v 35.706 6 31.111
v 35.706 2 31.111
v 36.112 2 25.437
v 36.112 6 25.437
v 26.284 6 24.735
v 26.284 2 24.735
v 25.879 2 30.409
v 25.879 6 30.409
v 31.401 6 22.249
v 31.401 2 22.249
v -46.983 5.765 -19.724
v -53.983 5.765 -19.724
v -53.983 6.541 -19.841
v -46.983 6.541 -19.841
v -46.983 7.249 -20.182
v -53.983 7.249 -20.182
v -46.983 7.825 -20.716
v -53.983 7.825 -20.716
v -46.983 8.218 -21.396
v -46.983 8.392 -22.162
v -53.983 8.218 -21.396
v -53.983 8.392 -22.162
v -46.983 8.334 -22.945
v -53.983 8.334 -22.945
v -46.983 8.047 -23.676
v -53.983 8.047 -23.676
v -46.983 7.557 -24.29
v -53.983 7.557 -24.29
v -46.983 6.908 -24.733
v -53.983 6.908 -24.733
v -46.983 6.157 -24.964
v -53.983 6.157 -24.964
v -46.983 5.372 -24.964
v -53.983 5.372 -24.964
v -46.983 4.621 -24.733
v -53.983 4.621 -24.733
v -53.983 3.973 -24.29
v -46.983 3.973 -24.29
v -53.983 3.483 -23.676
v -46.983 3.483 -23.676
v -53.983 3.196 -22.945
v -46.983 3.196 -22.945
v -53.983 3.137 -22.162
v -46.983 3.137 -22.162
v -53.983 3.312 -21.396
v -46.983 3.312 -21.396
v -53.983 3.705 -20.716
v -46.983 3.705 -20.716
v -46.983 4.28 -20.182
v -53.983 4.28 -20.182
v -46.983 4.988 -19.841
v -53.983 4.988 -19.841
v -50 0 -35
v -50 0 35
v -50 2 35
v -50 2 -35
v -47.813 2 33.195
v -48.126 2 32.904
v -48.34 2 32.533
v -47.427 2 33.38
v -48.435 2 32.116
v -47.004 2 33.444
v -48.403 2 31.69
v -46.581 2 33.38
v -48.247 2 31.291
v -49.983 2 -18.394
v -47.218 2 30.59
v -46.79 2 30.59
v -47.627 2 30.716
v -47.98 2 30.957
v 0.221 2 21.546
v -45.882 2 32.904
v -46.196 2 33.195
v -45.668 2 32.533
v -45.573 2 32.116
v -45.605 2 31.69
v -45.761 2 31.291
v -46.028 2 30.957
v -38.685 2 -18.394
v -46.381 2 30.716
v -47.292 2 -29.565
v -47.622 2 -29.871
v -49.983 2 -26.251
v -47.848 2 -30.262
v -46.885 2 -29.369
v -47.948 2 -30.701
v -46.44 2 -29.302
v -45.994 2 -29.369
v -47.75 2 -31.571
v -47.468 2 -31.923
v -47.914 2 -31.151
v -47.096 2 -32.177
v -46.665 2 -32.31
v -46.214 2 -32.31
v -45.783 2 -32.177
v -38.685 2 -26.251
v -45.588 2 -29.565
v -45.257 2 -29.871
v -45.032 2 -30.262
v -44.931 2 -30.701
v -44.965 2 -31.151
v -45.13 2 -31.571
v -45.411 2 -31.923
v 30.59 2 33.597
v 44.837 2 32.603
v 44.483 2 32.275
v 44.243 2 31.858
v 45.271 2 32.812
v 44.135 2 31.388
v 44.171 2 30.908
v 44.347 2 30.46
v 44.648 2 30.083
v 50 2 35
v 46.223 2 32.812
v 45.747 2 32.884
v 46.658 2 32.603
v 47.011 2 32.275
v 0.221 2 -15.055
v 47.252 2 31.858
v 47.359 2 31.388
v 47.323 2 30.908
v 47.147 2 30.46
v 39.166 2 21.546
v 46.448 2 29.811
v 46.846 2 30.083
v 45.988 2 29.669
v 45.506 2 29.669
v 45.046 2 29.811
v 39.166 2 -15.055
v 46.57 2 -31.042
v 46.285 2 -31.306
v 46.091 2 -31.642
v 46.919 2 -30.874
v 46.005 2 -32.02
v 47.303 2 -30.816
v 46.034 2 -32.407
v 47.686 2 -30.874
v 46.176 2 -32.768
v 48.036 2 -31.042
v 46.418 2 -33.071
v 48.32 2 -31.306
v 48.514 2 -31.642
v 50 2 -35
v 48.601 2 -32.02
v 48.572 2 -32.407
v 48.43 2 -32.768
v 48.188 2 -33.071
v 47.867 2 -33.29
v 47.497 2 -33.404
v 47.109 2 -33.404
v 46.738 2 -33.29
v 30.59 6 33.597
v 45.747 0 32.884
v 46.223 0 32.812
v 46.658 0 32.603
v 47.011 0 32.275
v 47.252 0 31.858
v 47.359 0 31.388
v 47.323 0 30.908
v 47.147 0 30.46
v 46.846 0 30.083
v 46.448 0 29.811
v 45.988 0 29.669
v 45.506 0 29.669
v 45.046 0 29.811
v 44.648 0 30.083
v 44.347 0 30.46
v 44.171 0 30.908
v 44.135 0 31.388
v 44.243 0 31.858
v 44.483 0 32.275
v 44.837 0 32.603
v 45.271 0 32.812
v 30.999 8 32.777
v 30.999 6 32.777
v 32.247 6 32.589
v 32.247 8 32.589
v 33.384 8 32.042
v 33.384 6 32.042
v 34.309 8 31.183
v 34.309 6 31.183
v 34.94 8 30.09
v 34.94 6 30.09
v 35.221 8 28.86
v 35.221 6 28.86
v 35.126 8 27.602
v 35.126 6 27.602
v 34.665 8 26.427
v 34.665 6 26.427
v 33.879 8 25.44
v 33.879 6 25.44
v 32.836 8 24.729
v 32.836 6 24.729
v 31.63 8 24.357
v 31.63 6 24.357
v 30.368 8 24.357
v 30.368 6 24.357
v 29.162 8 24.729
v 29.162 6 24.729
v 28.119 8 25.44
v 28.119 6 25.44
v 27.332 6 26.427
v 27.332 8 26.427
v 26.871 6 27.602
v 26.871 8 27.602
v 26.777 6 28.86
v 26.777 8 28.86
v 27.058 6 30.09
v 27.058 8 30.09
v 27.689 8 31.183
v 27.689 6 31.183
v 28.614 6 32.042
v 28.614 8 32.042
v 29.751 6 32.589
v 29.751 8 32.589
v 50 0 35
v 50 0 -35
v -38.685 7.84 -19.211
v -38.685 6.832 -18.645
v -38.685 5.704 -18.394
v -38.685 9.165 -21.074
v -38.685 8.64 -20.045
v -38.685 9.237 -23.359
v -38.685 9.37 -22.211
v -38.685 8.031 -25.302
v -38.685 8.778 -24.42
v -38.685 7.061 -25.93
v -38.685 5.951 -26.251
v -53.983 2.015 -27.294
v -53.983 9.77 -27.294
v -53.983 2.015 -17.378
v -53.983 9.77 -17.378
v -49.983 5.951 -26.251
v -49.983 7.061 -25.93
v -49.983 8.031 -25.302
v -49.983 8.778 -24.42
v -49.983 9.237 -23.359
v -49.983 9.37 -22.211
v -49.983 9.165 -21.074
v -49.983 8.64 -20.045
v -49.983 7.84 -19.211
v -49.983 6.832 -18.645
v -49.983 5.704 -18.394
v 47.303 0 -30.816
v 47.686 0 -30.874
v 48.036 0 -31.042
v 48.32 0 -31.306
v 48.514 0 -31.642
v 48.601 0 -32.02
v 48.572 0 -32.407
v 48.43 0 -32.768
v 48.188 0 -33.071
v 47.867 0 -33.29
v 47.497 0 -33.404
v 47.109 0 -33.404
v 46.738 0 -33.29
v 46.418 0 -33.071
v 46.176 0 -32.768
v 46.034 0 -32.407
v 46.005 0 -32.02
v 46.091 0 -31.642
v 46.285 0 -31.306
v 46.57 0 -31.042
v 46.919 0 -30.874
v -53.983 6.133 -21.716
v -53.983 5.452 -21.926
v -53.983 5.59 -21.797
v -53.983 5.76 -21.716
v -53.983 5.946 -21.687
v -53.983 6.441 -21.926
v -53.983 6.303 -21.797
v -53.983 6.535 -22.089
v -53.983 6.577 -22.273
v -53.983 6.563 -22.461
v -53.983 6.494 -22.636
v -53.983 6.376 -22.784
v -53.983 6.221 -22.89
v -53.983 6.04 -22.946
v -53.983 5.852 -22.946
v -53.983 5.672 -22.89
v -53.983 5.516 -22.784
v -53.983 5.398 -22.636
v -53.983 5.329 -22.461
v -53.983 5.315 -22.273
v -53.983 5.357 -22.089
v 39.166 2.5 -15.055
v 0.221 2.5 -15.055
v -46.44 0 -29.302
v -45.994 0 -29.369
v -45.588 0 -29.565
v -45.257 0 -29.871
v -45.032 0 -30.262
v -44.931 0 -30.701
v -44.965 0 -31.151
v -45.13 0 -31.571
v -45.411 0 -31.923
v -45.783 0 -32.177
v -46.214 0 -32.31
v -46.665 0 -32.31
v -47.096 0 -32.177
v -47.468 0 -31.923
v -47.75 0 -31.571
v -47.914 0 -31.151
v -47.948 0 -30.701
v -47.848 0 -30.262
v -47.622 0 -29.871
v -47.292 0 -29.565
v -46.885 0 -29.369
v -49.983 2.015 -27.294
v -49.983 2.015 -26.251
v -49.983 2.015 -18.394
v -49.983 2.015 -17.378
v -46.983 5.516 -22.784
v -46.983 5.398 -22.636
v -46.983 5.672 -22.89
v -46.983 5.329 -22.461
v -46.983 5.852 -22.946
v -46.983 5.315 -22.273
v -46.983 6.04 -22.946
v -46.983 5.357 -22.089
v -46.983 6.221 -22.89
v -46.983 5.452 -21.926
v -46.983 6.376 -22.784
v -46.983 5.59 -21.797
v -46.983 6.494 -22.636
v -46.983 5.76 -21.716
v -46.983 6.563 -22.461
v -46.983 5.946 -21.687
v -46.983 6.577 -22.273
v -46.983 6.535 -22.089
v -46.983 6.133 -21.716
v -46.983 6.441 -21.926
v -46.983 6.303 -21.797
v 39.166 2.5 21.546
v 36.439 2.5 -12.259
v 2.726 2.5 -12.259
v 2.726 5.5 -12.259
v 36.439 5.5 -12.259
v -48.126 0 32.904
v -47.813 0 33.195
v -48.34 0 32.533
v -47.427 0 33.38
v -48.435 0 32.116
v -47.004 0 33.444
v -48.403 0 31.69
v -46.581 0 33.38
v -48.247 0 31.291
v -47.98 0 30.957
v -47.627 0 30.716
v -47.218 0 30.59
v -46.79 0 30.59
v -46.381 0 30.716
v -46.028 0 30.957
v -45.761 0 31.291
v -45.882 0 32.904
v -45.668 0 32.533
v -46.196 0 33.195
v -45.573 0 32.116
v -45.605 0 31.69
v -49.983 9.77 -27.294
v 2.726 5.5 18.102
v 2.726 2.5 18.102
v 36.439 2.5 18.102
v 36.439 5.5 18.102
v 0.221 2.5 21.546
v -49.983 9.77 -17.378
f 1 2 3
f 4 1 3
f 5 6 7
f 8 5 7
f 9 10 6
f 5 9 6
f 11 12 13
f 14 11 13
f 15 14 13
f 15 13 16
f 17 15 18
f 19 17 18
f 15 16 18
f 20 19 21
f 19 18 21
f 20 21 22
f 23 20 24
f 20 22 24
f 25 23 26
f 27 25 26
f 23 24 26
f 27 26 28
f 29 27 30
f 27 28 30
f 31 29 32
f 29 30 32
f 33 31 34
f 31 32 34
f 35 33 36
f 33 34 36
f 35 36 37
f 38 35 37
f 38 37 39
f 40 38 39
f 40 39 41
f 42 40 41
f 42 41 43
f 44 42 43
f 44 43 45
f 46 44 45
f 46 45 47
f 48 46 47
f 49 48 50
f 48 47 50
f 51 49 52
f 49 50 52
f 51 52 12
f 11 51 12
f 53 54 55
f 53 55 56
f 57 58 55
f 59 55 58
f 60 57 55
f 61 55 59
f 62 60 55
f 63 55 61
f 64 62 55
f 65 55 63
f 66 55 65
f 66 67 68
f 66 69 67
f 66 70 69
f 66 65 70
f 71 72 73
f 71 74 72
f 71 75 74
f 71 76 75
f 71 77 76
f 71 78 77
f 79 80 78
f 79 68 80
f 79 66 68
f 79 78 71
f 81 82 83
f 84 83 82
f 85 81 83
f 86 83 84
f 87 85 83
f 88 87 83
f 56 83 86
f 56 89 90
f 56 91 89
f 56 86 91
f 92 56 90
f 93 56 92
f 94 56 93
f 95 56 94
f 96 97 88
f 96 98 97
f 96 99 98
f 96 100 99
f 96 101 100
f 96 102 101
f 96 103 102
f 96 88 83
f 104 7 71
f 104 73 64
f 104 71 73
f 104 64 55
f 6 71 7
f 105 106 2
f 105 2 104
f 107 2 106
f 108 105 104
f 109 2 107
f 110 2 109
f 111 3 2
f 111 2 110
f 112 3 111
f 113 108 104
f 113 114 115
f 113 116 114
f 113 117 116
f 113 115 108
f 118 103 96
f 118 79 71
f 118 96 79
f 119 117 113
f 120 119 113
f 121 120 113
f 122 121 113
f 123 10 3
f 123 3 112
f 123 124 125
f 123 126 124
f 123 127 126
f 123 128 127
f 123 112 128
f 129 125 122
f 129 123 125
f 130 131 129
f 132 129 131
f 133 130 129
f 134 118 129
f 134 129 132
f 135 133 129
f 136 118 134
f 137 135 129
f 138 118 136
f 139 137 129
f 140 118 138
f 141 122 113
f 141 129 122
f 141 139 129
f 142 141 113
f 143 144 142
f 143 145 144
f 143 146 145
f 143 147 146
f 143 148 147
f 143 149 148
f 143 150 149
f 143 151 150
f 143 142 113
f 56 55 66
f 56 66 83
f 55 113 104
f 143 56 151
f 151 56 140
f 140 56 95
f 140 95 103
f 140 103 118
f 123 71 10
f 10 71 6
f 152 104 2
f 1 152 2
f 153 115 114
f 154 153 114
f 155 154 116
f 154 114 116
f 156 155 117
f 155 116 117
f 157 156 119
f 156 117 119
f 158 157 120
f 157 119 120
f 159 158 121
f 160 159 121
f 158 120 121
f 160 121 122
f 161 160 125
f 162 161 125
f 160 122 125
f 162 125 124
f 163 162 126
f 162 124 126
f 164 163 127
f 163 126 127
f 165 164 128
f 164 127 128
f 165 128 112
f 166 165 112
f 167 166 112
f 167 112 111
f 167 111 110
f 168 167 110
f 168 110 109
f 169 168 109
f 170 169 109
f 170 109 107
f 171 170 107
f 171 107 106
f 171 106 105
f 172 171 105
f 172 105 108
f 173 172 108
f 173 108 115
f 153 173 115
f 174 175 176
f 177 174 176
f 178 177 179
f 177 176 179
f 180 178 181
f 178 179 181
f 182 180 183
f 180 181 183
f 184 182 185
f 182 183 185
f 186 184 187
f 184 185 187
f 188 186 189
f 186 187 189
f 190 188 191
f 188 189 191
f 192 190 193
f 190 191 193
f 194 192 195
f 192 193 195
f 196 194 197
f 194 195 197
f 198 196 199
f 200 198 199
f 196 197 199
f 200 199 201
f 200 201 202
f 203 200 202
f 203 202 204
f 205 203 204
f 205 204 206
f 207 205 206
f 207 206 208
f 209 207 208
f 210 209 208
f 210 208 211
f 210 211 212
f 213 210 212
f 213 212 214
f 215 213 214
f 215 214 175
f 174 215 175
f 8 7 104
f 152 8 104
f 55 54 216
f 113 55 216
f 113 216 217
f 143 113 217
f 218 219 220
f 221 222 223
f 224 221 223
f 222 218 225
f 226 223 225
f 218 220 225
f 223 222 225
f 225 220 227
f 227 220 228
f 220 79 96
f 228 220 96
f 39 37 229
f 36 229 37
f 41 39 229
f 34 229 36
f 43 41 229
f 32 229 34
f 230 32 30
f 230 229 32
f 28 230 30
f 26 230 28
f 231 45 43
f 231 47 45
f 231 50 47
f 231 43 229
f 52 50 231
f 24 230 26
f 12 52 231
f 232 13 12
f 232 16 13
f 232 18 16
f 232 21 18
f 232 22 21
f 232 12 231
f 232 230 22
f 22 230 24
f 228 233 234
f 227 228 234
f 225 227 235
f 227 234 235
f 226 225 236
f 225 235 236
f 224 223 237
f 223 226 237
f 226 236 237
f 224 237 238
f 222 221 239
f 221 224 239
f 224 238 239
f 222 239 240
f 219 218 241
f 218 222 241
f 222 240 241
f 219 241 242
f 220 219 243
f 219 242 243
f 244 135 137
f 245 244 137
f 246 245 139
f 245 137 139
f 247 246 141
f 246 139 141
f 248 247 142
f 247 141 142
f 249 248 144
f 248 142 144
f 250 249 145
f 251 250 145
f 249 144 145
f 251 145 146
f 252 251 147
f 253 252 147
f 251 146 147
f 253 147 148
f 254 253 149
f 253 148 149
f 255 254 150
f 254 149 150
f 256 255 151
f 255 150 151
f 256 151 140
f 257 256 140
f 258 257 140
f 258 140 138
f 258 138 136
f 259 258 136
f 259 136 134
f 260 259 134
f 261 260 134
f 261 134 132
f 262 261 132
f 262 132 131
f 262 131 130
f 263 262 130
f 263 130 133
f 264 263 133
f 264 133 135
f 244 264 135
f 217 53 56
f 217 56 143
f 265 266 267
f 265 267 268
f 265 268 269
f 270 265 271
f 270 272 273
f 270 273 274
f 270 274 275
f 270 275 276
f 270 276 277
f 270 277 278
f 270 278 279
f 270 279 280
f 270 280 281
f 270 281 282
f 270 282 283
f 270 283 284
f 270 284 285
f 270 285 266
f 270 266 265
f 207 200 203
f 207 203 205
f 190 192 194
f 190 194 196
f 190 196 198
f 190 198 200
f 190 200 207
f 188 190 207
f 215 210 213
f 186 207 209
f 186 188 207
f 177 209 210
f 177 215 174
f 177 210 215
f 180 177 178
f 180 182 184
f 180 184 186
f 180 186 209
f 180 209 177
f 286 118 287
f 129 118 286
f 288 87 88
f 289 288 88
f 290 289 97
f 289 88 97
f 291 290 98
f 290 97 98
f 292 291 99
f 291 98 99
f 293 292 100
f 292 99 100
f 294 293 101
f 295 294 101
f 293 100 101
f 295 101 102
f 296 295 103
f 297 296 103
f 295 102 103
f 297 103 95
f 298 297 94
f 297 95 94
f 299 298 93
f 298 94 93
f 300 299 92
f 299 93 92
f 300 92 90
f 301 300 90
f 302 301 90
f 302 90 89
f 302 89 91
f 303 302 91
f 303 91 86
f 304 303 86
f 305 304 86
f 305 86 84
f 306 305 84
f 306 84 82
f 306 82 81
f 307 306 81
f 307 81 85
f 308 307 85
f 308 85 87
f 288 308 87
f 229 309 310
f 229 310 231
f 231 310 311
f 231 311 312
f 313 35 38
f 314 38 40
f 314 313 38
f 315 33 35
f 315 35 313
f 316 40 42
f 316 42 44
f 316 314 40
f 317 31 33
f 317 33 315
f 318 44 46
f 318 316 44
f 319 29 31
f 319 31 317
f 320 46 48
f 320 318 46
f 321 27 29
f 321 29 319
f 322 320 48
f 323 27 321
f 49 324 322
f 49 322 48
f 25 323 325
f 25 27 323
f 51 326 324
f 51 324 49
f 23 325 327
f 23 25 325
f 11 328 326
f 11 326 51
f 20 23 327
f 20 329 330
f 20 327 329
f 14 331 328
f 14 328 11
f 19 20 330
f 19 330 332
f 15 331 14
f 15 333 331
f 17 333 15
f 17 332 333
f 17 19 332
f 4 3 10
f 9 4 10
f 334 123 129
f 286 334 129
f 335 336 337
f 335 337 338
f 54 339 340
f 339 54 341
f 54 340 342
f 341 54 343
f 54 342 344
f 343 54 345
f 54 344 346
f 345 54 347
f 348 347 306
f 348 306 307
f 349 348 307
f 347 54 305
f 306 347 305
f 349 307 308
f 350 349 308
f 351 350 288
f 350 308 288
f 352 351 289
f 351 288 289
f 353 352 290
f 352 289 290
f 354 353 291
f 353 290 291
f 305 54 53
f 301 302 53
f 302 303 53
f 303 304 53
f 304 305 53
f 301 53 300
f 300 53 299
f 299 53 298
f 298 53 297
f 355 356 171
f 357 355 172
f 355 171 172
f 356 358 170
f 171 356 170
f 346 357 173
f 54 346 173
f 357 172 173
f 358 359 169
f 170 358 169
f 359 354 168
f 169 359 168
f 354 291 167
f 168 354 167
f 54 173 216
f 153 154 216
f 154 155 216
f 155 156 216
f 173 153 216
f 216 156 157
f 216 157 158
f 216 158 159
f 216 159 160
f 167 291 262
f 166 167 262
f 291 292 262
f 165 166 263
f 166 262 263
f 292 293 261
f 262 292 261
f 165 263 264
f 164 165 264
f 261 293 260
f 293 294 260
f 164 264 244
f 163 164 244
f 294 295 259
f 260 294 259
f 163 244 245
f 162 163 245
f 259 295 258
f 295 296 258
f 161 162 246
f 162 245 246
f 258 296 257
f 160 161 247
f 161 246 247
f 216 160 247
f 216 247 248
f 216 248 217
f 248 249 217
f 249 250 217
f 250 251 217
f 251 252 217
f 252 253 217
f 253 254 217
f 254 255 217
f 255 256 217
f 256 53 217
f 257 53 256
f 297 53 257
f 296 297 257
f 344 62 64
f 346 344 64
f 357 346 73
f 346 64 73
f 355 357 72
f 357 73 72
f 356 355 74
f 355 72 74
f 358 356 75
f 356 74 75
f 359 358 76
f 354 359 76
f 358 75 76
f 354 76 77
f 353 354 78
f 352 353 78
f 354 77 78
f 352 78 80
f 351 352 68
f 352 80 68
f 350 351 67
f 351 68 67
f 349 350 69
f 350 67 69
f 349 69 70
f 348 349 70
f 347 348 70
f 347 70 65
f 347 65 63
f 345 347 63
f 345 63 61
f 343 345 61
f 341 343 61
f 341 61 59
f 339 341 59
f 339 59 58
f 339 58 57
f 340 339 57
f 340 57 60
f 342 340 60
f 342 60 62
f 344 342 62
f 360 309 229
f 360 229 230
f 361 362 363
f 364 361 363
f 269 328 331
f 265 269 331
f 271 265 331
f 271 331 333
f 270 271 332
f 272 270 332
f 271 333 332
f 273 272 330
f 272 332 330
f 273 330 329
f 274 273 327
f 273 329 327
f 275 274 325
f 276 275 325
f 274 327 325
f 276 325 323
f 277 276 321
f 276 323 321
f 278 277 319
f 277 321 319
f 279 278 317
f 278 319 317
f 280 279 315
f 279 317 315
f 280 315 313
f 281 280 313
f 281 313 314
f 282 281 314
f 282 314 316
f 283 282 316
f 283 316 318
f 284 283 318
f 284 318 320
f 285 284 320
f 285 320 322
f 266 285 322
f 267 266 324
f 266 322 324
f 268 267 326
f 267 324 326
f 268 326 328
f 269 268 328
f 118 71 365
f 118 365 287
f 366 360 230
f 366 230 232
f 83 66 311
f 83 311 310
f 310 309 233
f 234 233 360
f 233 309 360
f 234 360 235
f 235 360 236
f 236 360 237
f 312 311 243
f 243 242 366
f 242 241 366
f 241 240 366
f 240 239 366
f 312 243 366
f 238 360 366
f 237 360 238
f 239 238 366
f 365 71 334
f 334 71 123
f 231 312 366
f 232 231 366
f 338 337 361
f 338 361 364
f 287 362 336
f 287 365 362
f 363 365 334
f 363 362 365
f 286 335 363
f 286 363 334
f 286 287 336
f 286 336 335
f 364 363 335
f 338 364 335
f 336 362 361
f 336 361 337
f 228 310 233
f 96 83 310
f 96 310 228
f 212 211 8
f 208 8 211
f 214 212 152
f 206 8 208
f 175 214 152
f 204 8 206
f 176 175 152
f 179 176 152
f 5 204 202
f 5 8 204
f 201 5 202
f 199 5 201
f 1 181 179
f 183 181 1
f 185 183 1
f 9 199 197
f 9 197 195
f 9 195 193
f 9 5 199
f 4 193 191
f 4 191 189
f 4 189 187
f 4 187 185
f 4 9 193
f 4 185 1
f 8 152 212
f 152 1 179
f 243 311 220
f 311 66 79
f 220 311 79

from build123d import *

# Parameters (mm, degrees)
SKETCH1_W            = 100
SKETCH1_H            = 70
BOSS_EXTRUDE2_DEPTH  = 2
SKETCH2_R            = 1.51253395
CUT_EXTRUDE3_DEPTH   = 3
SKETCH3_R            = 1.435290784
CUT_EXTRUDE4_DEPTH   = 3
SKETCH4_R            = 1.301317422
CUT_EXTRUDE5_DEPTH   = 3
SKETCH5_R            = 1.616299526
CUT_EXTRUDE6_DEPTH   = 3
SKETCH6_W            = 17.296093804
SKETCH6_H            = 7.856677749
BOSS_EXTRUDE3_DEPTH  = 7.5
CUT_EXTRUDE14_DEPTH  = 19
CUT_EXTRUDE15_DEPTH  = 19
SKETCH15_W           = 9.915871842
SKETCH15_H           = 7.754440815
BOSS_EXTRUDE6_DEPTH  = 4
SKETCH16_R           = 2.634959219
CUT_EXTRUDE16_DEPTH  = 7
SKETCH17_R           = 0.632651109
BOSS_EXTRUDE7_DEPTH  = 7
SKETCH18_W           = 38.944699871
SKETCH18_H           = 36.600864012
BOSS_EXTRUDE8_DEPTH  = 0.5
SKETCH19_W           = 33.712674361
SKETCH19_H           = 30.360976244
BOSS_EXTRUDE9_DEPTH  = 3
SKETCH20_R           = 4.233704758
BOSS_EXTRUDE10_DEPTH = 6
BOSS_EXTRUDE11_DEPTH = 4


with BuildPart() as part:
    # Sketch1 → Boss-Extrude2 (new body)
    with BuildSketch(Plane(origin=(0, 0, 0), x_dir=(1, 0, 0), z_dir=(0, 1, 0))):
        Rectangle(SKETCH1_W, SKETCH1_H)
    extrude(amount=BOSS_EXTRUDE2_DEPTH)

    # Sketch2 → Cut-Extrude3 (cut)
    with BuildSketch(Plane(origin=(0, 2, 0), x_dir=(1, 0, 0), z_dir=(0, 1, 0))):
        with Locations(Location((-46.439620532, 30.814260712, 0), (0, 0, 270))):
            Circle(SKETCH2_R)
    extrude(amount=-CUT_EXTRUDE3_DEPTH, mode=Mode.SUBTRACT)

    # Sketch3 → Cut-Extrude4 (cut)
    with BuildSketch(Plane(origin=(0, 2, 0), x_dir=(1, 0, 0), z_dir=(0, 1, 0))):
        with Locations(Location((-47.004076073, -32.008947101, 0), (0, 0, 270))):
            Circle(SKETCH3_R)
    extrude(amount=-CUT_EXTRUDE4_DEPTH, mode=Mode.SUBTRACT)

    # Sketch4 → Cut-Extrude5 (cut)
    with BuildSketch(Plane(origin=(0, 2, 0), x_dir=(1, 0, 0), z_dir=(0, 1, 0))):
        with Locations(Location((47.302855544, 32.117059369, 0), (0, 0, 270))):
            Circle(SKETCH4_R)
    extrude(amount=-CUT_EXTRUDE5_DEPTH, mode=Mode.SUBTRACT)

    # Sketch5 → Cut-Extrude6 (cut)
    with BuildSketch(Plane(origin=(0, 2, 0), x_dir=(1, 0, 0), z_dir=(0, 1, 0))):
        with Locations(Location((45.747085663, -31.267682523, 0), (0, 0, 270))):
            Circle(SKETCH5_R)
    extrude(amount=-CUT_EXTRUDE6_DEPTH, mode=Mode.SUBTRACT)

    # Sketch6 → Boss-Extrude3 (add)
    with BuildSketch(Plane(origin=(0, 2, 0), x_dir=(1, 0, 0), z_dir=(0, 1, 0))):
        with Locations((-47.333268099, 22.322741547)):
            Rectangle(SKETCH6_W, SKETCH6_H)
    extrude(amount=BOSS_EXTRUDE3_DEPTH)

    # Sketch13 → Cut-Extrude14 (cut)
    with BuildSketch(Plane.ZY.offset(55.981315001)):
        with BuildLine():
            Line((-18.394402672, 9.5), (-26.251080421, 9.5))
            Line((-26.251080421, 9.5), (-26.251080421, 5.951221756))
            ThreePointArc((-26.251080421, 5.951221756), (-22.211334605, 9.370260294), (-18.394402672, 5.704144993))
            Line((-18.394402672, 5.704144993), (-18.394402672, 9.5))
        make_face()
    extrude(amount=-CUT_EXTRUDE14_DEPTH, mode=Mode.SUBTRACT)

    # Sketch14 → Cut-Extrude15 (cut)
    with BuildSketch(Plane(origin=(0, 2, 0), x_dir=(-1, 0, 0), z_dir=(0, -1, 0))):
        Polygon((49.983450697, 17.629135674), (49.983450697, 26.82990783), (57.169456537, 26.82990783), (57.911353863, 13.473102082), align=None)
    extrude(amount=-CUT_EXTRUDE15_DEPTH, mode=Mode.SUBTRACT)

    # Sketch15 → Boss-Extrude6 (add)
    with BuildSketch(Plane.ZY.offset(49.983450697)):
        with Locations((-22.336364996, 5.892577674)):
            Rectangle(SKETCH15_W, SKETCH15_H)
    extrude(amount=BOSS_EXTRUDE6_DEPTH)

    # Sketch16 → Cut-Extrude16 (cut)
    with BuildSketch(Plane.ZY.offset(53.983450697)):
        with Locations((-22.358887933, 5.764755063)):
            Circle(SKETCH16_R)
    extrude(amount=-CUT_EXTRUDE16_DEPTH, mode=Mode.SUBTRACT)

    # Sketch17 → Boss-Extrude7 (add)
    with BuildSketch(Plane.ZY.offset(46.983450697)):
        with Locations((-22.320088974, 5.946166612)):
            Circle(SKETCH17_R)
    extrude(amount=BOSS_EXTRUDE7_DEPTH)

    # Sketch18 → Boss-Extrude8 (add)
    with BuildSketch(Plane(origin=(0, 2, 0), x_dir=(1, 0, 0), z_dir=(0, 1, 0))):
        with Locations((19.693389893, -3.245226769)):
            Rectangle(SKETCH18_W, SKETCH18_H)
    extrude(amount=BOSS_EXTRUDE8_DEPTH)

    # Sketch19 → Boss-Extrude9 (add)
    with BuildSketch(Plane(origin=(0, 2.5, 0), x_dir=(1, 0, 0), z_dir=(0, 1, 0))):
        with Locations((19.582517613, -2.921097191)):
            Rectangle(SKETCH19_W, SKETCH19_H)
    extrude(amount=BOSS_EXTRUDE9_DEPTH)

    # Sketch20 → Boss-Extrude10 (add)
    with BuildSketch(Plane(origin=(0, 2, 0), x_dir=(1, 0, 0), z_dir=(0, 1, 0))):
        with Locations(Location((30.998863529, -28.543635421, 0), (0, 0, 270))):
            Circle(SKETCH20_R)
    extrude(amount=BOSS_EXTRUDE10_DEPTH)

    # Sketch21 → Boss-Extrude11 (add)
    with BuildSketch(Plane(origin=(0, 2, 0), x_dir=(1, 0, 0), z_dir=(0, 1, 0))):
        Polygon((35.70636757, -31.11116693), (36.11182012, -25.437321781), (31.400852359, -22.249266998), (26.284432048, -24.735057364), (25.878979498, -30.408902513), (30.589947259, -33.596957296), align=None)
    extrude(amount=BOSS_EXTRUDE11_DEPTH)


solid = part.part
